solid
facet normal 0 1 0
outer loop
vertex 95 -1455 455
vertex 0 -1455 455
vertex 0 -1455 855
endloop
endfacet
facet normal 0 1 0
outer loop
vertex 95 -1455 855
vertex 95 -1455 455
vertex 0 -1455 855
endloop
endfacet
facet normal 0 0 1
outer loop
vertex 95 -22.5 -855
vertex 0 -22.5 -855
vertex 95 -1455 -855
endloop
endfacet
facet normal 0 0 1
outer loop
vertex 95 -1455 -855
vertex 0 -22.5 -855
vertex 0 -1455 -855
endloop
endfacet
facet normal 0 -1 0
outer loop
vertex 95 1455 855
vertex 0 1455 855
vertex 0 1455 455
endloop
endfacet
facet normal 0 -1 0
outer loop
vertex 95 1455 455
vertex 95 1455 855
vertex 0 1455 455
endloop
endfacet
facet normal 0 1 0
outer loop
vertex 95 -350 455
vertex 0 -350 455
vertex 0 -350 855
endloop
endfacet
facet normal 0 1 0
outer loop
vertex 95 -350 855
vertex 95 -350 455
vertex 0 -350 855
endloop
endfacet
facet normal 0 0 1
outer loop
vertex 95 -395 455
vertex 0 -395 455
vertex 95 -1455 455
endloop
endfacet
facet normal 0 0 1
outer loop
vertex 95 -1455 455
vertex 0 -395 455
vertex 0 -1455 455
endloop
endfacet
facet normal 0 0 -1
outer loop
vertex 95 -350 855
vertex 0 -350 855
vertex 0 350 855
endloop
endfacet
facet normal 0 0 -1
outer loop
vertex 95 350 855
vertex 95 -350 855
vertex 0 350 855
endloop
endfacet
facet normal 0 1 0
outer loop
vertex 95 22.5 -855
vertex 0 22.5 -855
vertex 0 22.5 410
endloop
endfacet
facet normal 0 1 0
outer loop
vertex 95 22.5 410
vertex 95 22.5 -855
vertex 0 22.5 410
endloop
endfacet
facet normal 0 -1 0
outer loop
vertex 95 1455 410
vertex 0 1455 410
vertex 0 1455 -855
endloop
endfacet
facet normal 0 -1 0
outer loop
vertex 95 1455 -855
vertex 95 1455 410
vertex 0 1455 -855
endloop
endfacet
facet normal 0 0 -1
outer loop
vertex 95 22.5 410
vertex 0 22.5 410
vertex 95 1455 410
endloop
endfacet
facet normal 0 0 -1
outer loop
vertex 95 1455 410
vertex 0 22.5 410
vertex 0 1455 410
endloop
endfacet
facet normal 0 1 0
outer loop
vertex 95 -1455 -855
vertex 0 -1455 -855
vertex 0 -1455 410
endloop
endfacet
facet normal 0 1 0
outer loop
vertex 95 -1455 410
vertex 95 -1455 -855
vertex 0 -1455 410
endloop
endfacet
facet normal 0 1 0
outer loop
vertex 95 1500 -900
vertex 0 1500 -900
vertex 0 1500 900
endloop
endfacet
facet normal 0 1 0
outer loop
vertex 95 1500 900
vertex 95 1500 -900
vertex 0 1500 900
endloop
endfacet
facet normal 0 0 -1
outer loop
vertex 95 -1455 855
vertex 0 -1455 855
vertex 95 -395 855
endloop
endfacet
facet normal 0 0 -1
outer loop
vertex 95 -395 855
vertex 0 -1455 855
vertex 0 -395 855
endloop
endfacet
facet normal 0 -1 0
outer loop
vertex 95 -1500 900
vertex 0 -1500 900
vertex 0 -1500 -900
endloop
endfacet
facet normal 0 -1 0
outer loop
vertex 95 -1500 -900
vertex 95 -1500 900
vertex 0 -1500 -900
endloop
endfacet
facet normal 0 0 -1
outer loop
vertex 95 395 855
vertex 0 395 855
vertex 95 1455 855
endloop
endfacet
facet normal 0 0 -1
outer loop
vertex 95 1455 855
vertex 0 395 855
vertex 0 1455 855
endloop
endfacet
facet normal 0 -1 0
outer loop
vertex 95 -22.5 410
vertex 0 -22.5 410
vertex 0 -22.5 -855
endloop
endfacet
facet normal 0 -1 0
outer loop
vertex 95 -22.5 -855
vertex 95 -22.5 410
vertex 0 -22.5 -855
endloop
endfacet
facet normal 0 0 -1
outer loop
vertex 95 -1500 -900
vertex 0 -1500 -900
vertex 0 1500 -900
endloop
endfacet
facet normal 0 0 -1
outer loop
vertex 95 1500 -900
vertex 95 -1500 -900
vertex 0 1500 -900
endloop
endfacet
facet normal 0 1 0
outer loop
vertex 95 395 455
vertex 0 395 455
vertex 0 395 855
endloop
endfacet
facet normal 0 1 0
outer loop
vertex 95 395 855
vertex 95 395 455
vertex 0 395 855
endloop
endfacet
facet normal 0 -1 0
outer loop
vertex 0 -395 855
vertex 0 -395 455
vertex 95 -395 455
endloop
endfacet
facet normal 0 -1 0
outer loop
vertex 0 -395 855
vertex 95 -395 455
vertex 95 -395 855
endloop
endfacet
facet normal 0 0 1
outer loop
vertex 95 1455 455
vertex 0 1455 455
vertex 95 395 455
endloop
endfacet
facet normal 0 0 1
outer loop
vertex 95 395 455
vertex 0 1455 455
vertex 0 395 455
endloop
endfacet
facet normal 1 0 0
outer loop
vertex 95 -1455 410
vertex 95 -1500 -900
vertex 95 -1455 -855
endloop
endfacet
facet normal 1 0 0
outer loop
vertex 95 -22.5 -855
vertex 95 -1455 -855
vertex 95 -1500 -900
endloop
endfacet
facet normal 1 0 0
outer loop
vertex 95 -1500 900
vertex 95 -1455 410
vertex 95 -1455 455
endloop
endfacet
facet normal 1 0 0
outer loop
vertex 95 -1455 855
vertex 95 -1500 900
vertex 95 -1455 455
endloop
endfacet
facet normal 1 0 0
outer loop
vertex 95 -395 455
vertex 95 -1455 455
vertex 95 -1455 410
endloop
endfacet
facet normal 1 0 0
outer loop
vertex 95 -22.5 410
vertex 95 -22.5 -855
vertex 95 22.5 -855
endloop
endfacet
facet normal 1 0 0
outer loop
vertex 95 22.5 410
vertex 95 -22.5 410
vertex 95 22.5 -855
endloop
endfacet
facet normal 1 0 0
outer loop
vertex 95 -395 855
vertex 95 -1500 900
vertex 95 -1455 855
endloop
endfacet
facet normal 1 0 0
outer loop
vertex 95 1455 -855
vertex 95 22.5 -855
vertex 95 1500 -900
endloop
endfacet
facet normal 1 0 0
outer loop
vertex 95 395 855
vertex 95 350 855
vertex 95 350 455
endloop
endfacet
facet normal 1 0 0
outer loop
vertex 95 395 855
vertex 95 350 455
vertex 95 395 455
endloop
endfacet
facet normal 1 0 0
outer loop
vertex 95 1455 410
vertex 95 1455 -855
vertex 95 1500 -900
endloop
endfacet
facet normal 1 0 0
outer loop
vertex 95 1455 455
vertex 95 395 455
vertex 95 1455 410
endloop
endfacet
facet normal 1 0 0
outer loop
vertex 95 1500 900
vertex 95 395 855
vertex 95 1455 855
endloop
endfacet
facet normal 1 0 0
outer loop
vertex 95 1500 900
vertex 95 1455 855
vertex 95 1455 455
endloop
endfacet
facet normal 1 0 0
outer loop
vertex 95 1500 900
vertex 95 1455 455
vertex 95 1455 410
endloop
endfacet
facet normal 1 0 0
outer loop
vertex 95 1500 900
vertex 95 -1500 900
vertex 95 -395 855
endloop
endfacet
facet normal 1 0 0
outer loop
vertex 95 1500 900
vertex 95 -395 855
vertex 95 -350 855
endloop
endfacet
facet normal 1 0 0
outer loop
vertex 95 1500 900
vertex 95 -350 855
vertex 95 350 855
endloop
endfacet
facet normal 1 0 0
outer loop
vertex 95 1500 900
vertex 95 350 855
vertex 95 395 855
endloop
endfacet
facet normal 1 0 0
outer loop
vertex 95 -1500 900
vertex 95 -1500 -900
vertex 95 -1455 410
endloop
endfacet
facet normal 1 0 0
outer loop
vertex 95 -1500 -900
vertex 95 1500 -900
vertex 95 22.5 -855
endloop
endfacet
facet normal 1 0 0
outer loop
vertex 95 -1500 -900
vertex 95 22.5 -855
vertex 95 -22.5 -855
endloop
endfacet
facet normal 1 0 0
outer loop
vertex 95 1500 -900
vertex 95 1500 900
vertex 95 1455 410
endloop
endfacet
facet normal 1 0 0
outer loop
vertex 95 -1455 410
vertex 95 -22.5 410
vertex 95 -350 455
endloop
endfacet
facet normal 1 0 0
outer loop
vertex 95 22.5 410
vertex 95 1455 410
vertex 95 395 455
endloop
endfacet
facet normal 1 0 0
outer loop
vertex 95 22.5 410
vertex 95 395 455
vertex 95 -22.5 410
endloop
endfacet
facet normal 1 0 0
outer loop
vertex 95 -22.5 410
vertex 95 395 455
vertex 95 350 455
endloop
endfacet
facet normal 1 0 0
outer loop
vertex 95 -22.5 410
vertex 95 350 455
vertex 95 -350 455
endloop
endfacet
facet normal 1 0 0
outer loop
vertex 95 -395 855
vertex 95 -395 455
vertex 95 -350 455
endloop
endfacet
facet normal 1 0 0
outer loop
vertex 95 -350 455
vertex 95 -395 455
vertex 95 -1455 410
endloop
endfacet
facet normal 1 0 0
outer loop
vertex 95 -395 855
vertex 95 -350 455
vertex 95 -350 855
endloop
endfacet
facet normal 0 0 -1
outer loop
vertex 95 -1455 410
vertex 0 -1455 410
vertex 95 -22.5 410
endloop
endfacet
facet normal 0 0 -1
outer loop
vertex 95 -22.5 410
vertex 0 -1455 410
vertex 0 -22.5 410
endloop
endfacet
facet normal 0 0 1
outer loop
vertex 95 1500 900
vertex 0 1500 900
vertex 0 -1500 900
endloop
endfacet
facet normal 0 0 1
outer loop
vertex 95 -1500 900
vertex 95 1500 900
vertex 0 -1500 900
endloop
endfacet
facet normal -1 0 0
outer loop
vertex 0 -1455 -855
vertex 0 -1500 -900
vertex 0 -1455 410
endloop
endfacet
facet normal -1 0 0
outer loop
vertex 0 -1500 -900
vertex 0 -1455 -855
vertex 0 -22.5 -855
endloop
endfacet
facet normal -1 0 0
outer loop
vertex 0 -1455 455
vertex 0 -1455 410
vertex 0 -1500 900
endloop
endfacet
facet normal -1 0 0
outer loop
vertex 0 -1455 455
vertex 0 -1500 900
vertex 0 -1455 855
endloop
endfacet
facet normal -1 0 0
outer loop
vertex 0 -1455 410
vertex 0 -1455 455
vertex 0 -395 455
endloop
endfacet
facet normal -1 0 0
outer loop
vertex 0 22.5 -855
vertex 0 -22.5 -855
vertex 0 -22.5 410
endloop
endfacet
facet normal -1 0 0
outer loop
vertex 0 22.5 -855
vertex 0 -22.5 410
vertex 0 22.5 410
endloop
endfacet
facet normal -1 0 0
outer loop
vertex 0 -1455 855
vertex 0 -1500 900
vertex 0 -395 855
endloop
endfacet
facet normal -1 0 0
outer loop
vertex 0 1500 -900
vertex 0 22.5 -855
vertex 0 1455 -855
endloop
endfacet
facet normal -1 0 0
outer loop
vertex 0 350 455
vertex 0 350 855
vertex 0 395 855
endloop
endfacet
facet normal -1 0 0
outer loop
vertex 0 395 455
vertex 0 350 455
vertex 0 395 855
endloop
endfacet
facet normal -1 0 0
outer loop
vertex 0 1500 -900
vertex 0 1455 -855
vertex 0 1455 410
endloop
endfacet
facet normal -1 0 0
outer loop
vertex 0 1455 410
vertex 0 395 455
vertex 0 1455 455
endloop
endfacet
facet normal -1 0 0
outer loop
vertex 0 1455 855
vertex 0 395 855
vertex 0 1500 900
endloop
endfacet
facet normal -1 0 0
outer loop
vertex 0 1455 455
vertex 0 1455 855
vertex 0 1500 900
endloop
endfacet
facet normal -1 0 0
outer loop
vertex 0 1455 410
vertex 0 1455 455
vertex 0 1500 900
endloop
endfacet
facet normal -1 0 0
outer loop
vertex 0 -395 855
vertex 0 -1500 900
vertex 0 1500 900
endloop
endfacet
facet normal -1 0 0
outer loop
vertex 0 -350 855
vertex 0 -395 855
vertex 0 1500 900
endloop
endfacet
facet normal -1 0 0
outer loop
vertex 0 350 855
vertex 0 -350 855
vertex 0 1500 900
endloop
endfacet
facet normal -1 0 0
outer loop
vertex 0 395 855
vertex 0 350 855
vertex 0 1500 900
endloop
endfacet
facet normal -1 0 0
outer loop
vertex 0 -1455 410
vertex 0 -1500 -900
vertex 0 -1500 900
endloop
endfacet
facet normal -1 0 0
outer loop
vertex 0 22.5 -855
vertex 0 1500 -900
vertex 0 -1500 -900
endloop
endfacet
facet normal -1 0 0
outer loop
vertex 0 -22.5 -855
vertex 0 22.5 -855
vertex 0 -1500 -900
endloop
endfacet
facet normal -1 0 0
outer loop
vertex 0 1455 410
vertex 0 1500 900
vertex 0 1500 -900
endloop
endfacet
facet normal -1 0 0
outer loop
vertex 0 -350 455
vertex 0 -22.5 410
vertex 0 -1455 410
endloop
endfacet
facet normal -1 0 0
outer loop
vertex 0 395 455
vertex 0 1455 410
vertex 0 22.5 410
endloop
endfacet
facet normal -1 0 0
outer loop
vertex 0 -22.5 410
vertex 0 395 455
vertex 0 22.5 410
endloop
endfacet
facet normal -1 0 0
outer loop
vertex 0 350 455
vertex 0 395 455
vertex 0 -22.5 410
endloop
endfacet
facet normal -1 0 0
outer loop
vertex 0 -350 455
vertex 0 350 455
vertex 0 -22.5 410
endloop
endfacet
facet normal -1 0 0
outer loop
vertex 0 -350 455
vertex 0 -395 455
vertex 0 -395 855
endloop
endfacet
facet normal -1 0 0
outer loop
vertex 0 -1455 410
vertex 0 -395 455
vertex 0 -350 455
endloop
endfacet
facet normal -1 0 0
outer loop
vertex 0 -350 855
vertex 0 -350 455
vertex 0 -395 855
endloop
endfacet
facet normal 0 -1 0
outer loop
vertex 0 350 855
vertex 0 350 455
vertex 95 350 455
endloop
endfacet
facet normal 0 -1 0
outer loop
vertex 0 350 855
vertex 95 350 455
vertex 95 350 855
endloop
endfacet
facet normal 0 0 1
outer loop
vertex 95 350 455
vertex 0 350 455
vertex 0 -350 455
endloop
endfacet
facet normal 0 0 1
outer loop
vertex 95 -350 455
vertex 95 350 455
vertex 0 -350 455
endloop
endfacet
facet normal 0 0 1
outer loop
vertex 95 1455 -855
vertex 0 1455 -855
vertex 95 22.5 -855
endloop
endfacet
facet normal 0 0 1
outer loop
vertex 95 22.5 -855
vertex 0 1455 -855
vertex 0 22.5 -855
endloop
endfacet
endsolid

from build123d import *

# Parameters (mm, degrees)
F0_W     = 45
F0_H     = 400
F1_DEPTH = 95


# Not quite as in the source:
# - a feature names something its author has since deleted; it is built from what else it names


with BuildPart() as f1:
    # F0 (on Right) → F1 (new body)
    with BuildSketch(Plane.YZ):
        Polygon((1500, 900), (-1500, 900), (-1500, 855), (-1455, 855), (-395, 855), (-350, 855), (-117.5, 855), (22.5, 855), (350, 855), (395, 855), (1455, 855), (1500, 855), align=None)
        Polygon((-1455, 855), (-1500, 855), (-1500, -855), (-1455, -855), (-1455, 410), (-1455, 455), align=None)
        Polygon((1500, -855), (1500, 855), (1455, 855), (1455, 455), (1455, 410), (1455, 22.5), (1455, -22.5), (1455, -855), align=None)
        Polygon((-1455, -855), (-1500, -855), (-1500, -900), (1500, -900), (1500, -855), (1455, -855), (117.5, -855), (22.5, -855), (-22.5, -855), align=None)
        with Locations((372.5, 655)):
            Rectangle(F0_W, F0_H)
        with Locations((-372.5, 655)):
            Rectangle(F0_W, F0_H)
        Polygon((-395, 455), (-1455, 455), (-1455, 410), (-22.5, 410), (22.5, 410), (1455, 410), (1455, 455), (395, 455), (350, 455), (-350, 455), align=None)
        Polygon((-22.5, 410), (-22.5, -855), (22.5, -855), (22.5, -22.5), (22.5, 22.5), (22.5, 410), align=None)
    extrude(amount=F1_DEPTH)


solid = f1.part
